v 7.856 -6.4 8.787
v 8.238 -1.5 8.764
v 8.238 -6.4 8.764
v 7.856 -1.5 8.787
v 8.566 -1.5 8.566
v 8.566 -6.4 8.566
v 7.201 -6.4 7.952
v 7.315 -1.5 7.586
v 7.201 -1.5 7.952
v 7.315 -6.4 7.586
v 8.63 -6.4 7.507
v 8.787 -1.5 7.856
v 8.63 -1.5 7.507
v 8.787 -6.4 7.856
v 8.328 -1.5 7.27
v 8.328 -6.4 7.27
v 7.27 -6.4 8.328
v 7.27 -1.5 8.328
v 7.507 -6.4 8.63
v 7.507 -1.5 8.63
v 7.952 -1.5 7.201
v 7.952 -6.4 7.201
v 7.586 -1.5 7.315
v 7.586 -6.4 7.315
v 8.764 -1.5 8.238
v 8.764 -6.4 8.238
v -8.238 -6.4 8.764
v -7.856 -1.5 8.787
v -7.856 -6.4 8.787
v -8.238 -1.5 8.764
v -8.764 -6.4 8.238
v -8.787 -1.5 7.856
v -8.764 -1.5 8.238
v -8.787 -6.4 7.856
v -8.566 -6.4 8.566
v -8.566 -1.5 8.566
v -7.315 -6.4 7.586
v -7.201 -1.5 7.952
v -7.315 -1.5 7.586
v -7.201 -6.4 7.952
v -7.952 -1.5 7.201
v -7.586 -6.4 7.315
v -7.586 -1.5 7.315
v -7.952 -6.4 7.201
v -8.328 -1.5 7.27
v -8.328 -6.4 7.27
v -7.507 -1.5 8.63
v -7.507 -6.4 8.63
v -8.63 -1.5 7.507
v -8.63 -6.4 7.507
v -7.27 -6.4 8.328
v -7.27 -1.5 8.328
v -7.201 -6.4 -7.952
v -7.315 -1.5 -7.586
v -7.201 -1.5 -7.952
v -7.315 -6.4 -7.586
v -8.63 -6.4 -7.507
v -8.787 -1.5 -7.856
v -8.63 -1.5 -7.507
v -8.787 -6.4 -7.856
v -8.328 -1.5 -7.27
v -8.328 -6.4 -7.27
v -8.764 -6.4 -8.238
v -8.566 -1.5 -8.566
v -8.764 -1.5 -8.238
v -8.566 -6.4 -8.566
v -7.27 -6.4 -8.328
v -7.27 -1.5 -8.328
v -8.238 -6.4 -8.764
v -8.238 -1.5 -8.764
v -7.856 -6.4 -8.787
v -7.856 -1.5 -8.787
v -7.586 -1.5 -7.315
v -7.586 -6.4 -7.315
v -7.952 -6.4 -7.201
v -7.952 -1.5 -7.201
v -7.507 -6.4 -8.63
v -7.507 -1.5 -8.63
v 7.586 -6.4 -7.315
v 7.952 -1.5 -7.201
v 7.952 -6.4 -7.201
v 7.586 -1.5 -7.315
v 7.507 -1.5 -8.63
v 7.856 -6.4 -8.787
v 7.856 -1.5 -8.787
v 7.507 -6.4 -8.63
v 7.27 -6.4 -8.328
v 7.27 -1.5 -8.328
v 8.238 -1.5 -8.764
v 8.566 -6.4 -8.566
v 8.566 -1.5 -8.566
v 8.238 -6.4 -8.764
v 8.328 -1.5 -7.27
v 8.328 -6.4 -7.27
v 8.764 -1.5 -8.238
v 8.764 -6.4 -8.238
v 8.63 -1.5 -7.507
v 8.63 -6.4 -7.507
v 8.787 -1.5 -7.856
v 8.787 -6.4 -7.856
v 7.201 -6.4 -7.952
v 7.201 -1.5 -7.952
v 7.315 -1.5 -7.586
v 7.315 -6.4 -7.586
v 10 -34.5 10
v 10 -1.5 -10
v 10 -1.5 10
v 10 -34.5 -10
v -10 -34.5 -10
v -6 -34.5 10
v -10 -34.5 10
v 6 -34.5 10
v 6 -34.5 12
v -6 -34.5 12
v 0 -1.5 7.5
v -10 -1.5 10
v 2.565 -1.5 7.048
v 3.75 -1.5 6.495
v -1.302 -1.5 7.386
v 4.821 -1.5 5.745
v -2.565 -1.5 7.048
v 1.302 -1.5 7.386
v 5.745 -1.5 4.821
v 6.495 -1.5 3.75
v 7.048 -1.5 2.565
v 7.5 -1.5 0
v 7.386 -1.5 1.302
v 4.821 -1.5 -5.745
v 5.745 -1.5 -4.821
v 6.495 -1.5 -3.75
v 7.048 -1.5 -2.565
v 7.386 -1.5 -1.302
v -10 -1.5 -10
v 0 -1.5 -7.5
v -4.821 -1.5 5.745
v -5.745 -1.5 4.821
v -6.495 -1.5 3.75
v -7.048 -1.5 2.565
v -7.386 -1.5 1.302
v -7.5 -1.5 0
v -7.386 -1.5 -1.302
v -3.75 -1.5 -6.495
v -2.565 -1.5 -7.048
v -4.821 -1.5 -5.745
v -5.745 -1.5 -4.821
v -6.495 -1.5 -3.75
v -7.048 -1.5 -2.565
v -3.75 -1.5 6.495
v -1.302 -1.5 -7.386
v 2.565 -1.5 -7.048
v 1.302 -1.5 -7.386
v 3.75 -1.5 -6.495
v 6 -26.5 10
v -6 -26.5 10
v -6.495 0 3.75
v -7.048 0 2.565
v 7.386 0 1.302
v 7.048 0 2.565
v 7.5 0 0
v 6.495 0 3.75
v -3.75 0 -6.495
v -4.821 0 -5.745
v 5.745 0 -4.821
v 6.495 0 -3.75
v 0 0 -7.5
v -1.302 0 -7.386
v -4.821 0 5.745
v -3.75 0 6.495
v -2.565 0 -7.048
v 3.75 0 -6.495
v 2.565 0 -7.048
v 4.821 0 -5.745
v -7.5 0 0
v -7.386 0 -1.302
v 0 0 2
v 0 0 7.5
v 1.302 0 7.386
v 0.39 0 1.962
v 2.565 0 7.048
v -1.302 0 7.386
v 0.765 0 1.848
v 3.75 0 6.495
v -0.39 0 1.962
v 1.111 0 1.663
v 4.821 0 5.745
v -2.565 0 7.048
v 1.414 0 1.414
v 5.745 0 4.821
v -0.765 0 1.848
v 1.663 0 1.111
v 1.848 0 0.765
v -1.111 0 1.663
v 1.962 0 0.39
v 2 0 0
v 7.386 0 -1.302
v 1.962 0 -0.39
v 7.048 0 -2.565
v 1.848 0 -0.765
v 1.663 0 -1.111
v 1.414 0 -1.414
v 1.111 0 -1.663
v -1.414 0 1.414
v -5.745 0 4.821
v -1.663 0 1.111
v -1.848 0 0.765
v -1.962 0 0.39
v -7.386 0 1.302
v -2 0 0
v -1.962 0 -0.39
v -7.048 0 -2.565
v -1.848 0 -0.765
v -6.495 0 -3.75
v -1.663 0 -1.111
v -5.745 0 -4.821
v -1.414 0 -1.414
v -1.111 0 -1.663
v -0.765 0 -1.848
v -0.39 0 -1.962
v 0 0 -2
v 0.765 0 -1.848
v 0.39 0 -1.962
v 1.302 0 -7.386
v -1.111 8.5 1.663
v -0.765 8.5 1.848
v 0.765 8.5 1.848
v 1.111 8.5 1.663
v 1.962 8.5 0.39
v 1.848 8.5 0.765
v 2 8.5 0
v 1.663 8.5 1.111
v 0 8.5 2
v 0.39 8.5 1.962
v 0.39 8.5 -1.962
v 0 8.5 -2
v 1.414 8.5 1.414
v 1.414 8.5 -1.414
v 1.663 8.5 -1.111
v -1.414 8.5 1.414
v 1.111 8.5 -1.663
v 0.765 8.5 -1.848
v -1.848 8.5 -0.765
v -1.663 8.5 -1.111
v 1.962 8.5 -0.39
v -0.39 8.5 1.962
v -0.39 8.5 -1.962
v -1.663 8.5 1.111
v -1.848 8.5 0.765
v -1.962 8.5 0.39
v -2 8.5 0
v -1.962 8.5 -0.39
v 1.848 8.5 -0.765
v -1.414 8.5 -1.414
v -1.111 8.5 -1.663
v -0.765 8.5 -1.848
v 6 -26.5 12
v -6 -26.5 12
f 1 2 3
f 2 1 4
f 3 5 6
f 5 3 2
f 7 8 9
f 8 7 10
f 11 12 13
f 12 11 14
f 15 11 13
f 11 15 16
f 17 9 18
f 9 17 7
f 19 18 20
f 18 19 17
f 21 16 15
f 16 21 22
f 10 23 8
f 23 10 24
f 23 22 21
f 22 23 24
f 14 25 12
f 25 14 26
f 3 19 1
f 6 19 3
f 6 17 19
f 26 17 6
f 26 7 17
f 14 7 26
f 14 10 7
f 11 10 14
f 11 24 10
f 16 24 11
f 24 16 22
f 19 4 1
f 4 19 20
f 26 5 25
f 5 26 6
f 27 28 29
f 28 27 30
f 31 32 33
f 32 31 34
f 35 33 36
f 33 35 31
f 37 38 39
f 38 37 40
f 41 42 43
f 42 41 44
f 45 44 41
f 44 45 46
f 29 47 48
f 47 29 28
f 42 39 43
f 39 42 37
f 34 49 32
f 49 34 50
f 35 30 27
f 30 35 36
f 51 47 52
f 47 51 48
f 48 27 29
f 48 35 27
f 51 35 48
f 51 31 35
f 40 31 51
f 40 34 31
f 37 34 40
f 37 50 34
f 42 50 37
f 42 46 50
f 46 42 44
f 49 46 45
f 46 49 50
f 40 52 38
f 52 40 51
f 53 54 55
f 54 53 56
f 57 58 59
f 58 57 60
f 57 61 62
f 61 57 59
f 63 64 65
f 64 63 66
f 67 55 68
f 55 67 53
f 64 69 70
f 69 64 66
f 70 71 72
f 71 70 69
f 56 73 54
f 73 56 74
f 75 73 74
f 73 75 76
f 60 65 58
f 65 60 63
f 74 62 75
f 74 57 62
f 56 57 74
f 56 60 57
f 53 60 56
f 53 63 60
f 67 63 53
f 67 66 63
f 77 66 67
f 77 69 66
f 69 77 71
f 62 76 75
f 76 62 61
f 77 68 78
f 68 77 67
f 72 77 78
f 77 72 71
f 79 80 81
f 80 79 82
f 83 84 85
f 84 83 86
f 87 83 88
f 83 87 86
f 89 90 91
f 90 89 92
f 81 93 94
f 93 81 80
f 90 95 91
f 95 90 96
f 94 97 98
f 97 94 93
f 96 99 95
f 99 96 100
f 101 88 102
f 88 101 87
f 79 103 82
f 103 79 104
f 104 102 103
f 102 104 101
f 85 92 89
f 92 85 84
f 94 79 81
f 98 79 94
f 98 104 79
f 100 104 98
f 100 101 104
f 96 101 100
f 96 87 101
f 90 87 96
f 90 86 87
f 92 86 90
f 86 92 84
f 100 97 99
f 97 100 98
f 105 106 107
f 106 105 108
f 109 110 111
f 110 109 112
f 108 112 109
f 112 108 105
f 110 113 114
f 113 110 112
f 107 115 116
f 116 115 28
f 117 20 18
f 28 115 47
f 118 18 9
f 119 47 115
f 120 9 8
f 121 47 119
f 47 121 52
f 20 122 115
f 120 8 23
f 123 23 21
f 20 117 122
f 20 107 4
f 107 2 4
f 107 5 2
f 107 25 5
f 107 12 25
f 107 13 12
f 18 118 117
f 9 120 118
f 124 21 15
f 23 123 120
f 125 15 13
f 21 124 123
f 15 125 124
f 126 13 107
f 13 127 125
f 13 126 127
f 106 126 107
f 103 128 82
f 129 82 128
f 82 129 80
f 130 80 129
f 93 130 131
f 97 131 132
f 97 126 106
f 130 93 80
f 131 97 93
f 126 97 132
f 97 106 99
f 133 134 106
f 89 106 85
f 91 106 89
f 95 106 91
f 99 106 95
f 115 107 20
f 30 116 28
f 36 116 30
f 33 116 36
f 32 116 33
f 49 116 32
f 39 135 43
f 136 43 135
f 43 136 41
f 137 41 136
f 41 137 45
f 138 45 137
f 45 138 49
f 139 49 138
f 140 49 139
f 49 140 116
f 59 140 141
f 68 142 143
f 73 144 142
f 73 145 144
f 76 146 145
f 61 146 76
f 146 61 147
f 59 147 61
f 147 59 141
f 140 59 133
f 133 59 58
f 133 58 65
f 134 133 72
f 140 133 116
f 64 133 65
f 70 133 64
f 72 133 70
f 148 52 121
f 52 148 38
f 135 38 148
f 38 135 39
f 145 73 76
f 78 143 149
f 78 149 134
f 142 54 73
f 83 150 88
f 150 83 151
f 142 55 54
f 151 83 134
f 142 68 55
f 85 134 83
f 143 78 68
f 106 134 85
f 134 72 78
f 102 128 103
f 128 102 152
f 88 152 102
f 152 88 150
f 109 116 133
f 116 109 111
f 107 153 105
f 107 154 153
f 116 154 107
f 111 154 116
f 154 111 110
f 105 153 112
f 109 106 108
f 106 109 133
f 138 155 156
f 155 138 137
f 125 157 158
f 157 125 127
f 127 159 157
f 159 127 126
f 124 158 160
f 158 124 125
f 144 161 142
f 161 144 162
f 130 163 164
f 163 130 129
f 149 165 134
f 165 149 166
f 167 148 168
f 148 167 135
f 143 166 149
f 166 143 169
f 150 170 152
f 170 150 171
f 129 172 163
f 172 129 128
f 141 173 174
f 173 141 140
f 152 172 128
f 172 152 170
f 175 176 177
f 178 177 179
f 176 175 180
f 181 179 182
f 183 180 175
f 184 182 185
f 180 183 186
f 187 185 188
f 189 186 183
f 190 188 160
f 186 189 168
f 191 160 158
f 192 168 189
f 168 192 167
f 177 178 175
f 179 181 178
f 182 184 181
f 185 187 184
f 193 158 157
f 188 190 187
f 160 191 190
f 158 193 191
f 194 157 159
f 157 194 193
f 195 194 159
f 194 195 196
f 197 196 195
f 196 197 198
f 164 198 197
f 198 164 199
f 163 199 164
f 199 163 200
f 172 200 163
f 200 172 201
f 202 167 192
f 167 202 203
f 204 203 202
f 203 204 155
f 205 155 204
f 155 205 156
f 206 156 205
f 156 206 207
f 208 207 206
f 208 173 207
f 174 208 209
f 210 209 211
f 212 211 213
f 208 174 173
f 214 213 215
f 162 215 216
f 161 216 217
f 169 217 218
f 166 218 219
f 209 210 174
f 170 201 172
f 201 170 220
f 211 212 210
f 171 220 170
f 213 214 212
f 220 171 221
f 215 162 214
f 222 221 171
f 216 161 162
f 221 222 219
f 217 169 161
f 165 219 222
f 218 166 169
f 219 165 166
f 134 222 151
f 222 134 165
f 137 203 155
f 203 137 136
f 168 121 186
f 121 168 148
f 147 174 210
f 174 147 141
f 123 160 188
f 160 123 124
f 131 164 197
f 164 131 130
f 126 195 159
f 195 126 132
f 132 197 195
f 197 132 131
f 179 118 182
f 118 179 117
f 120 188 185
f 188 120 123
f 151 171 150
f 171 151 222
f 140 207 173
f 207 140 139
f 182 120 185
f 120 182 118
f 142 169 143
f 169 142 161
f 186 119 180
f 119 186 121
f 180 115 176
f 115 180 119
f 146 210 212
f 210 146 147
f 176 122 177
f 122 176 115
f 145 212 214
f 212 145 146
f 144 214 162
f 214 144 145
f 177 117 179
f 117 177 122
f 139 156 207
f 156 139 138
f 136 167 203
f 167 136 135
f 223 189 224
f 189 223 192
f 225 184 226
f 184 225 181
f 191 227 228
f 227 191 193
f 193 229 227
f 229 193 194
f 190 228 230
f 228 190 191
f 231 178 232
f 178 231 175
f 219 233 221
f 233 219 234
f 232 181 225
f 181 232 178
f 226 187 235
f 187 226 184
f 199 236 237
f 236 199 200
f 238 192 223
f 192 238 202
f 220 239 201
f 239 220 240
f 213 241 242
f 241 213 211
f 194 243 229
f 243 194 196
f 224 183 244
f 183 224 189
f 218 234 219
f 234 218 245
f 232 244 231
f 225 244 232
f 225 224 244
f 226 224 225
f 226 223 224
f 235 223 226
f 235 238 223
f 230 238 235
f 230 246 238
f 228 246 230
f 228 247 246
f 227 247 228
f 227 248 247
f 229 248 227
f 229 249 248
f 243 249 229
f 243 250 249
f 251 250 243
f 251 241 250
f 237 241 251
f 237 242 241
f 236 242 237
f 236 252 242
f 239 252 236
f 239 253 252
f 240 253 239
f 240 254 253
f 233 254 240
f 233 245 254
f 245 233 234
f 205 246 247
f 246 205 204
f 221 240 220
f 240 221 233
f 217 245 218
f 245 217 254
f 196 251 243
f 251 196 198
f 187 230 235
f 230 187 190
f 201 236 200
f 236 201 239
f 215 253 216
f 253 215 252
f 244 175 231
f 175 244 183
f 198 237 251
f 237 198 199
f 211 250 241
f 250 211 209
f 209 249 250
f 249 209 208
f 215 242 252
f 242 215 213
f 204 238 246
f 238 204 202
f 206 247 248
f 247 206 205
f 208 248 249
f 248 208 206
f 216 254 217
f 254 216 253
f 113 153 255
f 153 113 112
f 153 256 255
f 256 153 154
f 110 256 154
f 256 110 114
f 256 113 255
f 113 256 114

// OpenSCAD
// file: Parametric_ball_chain_pulley/parametric_ball_pulley.scad
// Parametric ball chain pulley
// Based on "Parametric Ball Pulley" by zignig (http://www.thingiverse.com/thing:1322)

// Quality of cylinders/spheres
$fa = 10;
$fs = 0.4;

// 0 = use grub screws and captive nut
// 1 = use a hose clamp
// 2 = use two "flat spots" on the shaft
// 3 = use one "flat spot" on the shaft
fastening_method = 2;

// General options
shaft_diameter = 4;
ball_diameter = 3.7;
ball_count = 15;
ball_spacing = 5.1; // The distance from the centre of one ball to the next
link_diameter = 0.9;

// Screw options
screw_diameter = 3;
screw_count = 3;
nut_diameter = 6.3; // correct?
nut_height = 2.3; // correct?

// Hose clamp options
clamp_inner_diameter = 13;
clamp_width = 8;

// Flat spot options
flat_spot_diameter = 4;

// Calculate dimensions
PI = 3.1415927;
wheel_diameter = ball_count*ball_spacing / PI;
wheel_height = ball_diameter*1.5;
function getWheelHeight() = wheel_height;
boss_diameter = ( fastening_method == 0
                ? shaft_diameter + (nut_height*2)*2
                : ( fastening_method == 1
                  ? clamp_inner_diameter
                  : shaft_diameter*2 ) );
boss_height = 0;
// boss_height = ( fastening_method == 0
//               ? nut_diameter
//               : ( fastening_method == 1
//                 ? clamp_width
//                 : wheel_height ) );
pulley_height = wheel_height + boss_height;
function getPulleyHeight() = pulley_height;

module pulley () {
    difference()
    {
        cylinder (pulley_height, r = wheel_diameter/2, center=true, $fn = ball_count);
        
        // Boss cutout
        translate ([0, 0, pulley_height/2])
        difference () {
            cylinder (boss_height * 2, r = wheel_diameter, center=true);
            cylinder (boss_height * 4, r = boss_diameter/2, center=true);
        }
        
        // Balls
        translate ([0, 0, pulley_height/-2 + wheel_height/2])
        for (i = [1:ball_count])
        {
            rotate ([0, 0, (360/ball_count) * i])
            translate ([wheel_diameter/2,0,0])
            sphere (r = ball_diameter/2);
        }
        
        // Flat spot shaft
        if (fastening_method == 2 || fastening_method == 3) {
            intersection () {
                cylinder ( pulley_height*2, r = shaft_diameter/2, center = true);
                
                translate ([ (fastening_method == 3 ? shaft_diameter/2 - flat_spot_diameter/2 : 0) , 0, 0])
                cube ([flat_spot_diameter, shaft_diameter*2,  pulley_height*3], center = true);
            }
        }
        // Normal shaft
        else {
            cylinder (pulley_height*2, r = shaft_diameter/2, center=true);
        }
        
        // Holes for links between balls
        translate ([0, 0, pulley_height/-2 + wheel_height/2])
        rotate ([0, 0, -90]) // Rotate -90 to match face direction of cylinder
        rotate_extrude (convexity = 5, $fn = ball_count)
        translate ([wheel_diameter/2, 0, 0])
        circle (r = link_diameter/2);
        
        // Screw and nut holes
        if (fastening_method == 0) {
            translate ([0, 0, pulley_height/2 - boss_height/2])
            for (i = [1: screw_count]) {
                rotate ([0, 0, 360/screw_count * i]) {
                    translate ([boss_diameter/2, 0, 0])
                    rotate ([0 ,90 , 0])
                    cylinder (boss_diameter, r = screw_diameter/2, center = true);
                    
                    translate ([shaft_diameter/2 + (boss_diameter/2 - shaft_diameter/2)/2 - nut_height/4, 0, 0]) {
                        rotate ([0 , 90, 0])
                        cylinder (nut_height, r = nut_diameter/2, center = true, $fn = 6);
                        
                        translate ([0, 0, boss_height / 2])
                        cube ([nut_height, sin(60) * nut_diameter, boss_height], center = true);
                    }
                }
            }
        }
        // Hose clamp "splines"
        else if (fastening_method == 1) {
            translate ([0, 0, pulley_height/2])
            for (i = [0:1]) {
                rotate ([0, 0, i * 90])
                cube ([0.7, boss_diameter*2 , boss_height * 2], center = true);
            }
        }
    }
}

translate ([0, 0, pulley_height/2])
pulley();

echo ( str ("Pulley height: ", pulley_height) );
echo ( str ("Pulley diameter: ", wheel_diameter ) );
// main file
// BASE UNIT -- MM
$fa = 10;
$fs = 0.4;

use <Parametric_ball_chain_pulley/parametric_ball_pulley.scad>
use <gears/gears.scad>

NEMA8_COORDS = [
    [16, 0], [16,16],
    [ 0, 0], [ 0,16]
];
NEMA8_RADIUS = sqrt(16^2+16^2)/2;
M3_THREAD = 2.5;
M3_CLEARANCE = 3.4;
M2_THREAD = 1.6;
M2_CLEARANCE = 2.4;
M2_COUNTERSINK_HEAD_DIAMETER = 4;
M2_COUNTERSINK_HEAD_THICK = 1.2;
M2_COUNTERSINK_HEAD_ANGLE = 90;


/*-------------*\
  STEPPER MOTOR  
\*-------------*/
bodyWidth = 20;
bodyHeight = 20;
bodyLength = 33;
neckDiameter = 15;
neckThick = 1.5;
shaftRadius = 4/2;
shaftLenth = 10; // Measured from body, not neck! Protrusion is shorter.
socketWidth = 12;
socketLength = 8;
socketHeight = 2;
module Stepper() {
    // Centered on the base of the usable shaft length.
    // body
    difference() {
        translate([0, 0, neckThick+bodyLength/2])
        cube([bodyWidth, bodyHeight, bodyLength], center=true);
        // mounting holes. Approx 5mm deep? Not accurate.
        for (deg=[0:90:360]) { rotate(deg+45) {
            translate([NEMA8_RADIUS, 0, neckThick+2.4])
            cylinder(d=M2_THREAD, h=5, center=true);
        }}
    };
    // neck/collar thing
    translate([0, 0, neckThick/2])
    cylinder(d=neckDiameter, h=neckThick, center=true);
    // shaft
    translate([0, 0, -shaftLenth/2+neckThick])
    cylinder(r=shaftRadius, h=shaftLenth, center=true);
    // microblade socket
    translate([-socketWidth/2, bodyHeight/2, bodyLength+neckThick-socketLength])
    cube([socketWidth, socketHeight, socketLength]);
};


/*---*\
  HUB  
\*---*/
// hubDiameter = 19;
// hubThick = 5;
// hubMountRadius = 6.35;
// hubBore = 4;
// hubThreads = "M3";
// module PololuUniversalHub() {
//     difference() {
//         cylinder(d=hubDiameter, h=hubThick, center=true);
//         for (deg=[0:90:360]) { rotate(deg) {
//             translate([hubMountRadius, 0, 0])
//             cylinder(d=3, h=hubThick*3, center=true);
//         }}
//         cylinder(d=hubBore, h=hubThick*3, center=true);
//     }
// }
hubDiameter     = 32;
hubThick        = 8;
hubNeckDia      = 14;
hubNeckThick    = 2;
hubMountRadius  = sqrt(16^2+16^2)/2;
hubBore         = 4;
hubThreads = "M4x0.7";
module GBSonicHub() {
    difference() {
        union() {
            // body
            difference() {
                cylinder(d=hubDiameter, h=hubThick, center=true);
                for (deg=[0:90:360]) {
                    rotate(deg)
                    translate([hubMountRadius,0,-hubThick*0.55])
                    cylinder(d=4, h=hubThick*1.1);
                }
            };
            // neck
            translate([0,0,-hubThick+hubNeckThick])
            cylinder(d=hubNeckDia, h=hubNeckThick);
        }
        translate([0,0,-(hubThick-neckThick-0.1)])
        cylinder(d=hubBore*1.01, h=(hubThick+neckThick)*1.1);
    }
}

bearingThick = 7;
bearingHeight = 43;
bearingBodyWidth = 38;
bearingOD = 43;
bearingID = 32;
bearingMountDistance = 32;
bearingThreads = "M4x0.7";
module GBPillow() {
    difference() {
        union() {
            // body
            cube([bearingBodyWidth, bearingHeight, bearingThick], center=true);
            // OD
            cylinder(d=bearingOD, h=bearingThick-0.01, center=true);
        }
        // ID
        cylinder(d=bearingID, h=bearingThick*1.1, center=true);
        // Mounting threads
        rotate([90, 90, 0]){
            translate([0, bearingMountDistance/2, -bearingHeight*1.1/2])
            cylinder(d=4, h=bearingHeight*1.1);
            translate([0, -bearingMountDistance/2, -bearingHeight*1.1/2])
            cylinder(d=4, h=bearingHeight*1.1);
        }
        
    }
}

/*----*\
  CASE  
\*----*/
stepperMountThick = neckThick;
module StepperMount() {
    difference() {
        // BASE
        cube([bodyWidth, bodyHeight, stepperMountThick]);

        // NECK
        translate([bodyWidth/2, bodyHeight/2, stepperMountThick])
        cylinder(d=neckDiameter+1, h=stepperMountThick*3, center=true);

        // NEMA
        translate([bodyWidth/2, bodyHeight/2, stepperMountThick])
        for (deg=[0:90:360]) { rotate(deg+45) {
            translate([NEMA8_RADIUS, 0, -stepperMountThick+M2_COUNTERSINK_HEAD_THICK/2-0.01]) {
            cylinder(d1=M2_COUNTERSINK_HEAD_DIAMETER, d2=2,
                     h=M2_COUNTERSINK_HEAD_THICK, center=true);
            cylinder(d=M2_CLEARANCE, h=stepperMountThick*3, center=true);
            }
        }}
    }
}
module BottomCase() {
    StepperMount();
}
module TopCase() {
    
}


/*--------*\
  ASSEMBLE  
\*--------*/
stepperGap = 3-neckThick;

// rotate([90,0,0])
// translate([0,0,-neckThick-0.1])
// BottomCase();

color([0.3, 0.3, 0.3]) // dark grey
rotate([90,0,0])
Stepper();

// color([0.8, 0.8, 0.8]) // light grey
rotate([90,0,0])
translate([0,0,-(hubThick/2 + stepperGap)])
%GBSonicHub();

// color([0.85, 0.85, 0.85]) // light grey but aluminum
rotate([90,0,0])
translate([0,0,-(hubThick/2 + stepperGap)])
%GBPillow();

gearWidth = 4;
// rotate([90,0,0])
// translate([ bodyWidth/2,
//             bodyWidth/2,
//             -(gearWidth + stepperGap)])
// spur_gear(  modul=2,
//             tooth_number=20,
//             width=gearWidth,
//             bore=4,
//             pressure_angle=20);

// rotate([90,0,180])
// translate([ -bodyWidth/2,
//             bodyWidth/2,
//             getPulleyHeight() + stepperGap ])
// pulley();
